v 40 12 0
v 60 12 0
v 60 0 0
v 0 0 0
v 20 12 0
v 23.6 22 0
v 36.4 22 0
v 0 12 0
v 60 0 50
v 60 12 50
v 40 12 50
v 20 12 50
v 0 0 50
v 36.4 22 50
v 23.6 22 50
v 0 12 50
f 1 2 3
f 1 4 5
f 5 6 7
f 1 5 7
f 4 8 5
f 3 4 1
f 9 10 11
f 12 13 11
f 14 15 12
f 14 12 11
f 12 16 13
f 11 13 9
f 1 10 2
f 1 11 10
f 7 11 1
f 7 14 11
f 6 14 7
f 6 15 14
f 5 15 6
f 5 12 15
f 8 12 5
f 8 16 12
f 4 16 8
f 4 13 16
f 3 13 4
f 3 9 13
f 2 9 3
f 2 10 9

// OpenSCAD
$fn = 32;

// ----------------------------------------------------------------------
// V guide rail: dovetail, 60 mm wide
// ----------------------------------------------------------------------

// --- parameters (mm) ---
rail_w = 60;              // rail width, X
base_t = 12;              // base plate thickness
v_depth = 10;             // V feature depth / height
v_half_w = 10;            // half width of the V at the base face
plate_t = 50;             // rail length, Z (the extrusion height)
top_half_w = 6.4;         // half width at the dovetail top

dovetail_base = 2 * v_half_w;  // dovetail width at the base
dovetail_top = 2 * top_half_w;  // dovetail width at the top

profile = [[0, 0], [60, 0], [60, 12], [40, 12], [36.4, 22], [23.6, 22], [20, 12], [0, 12]];  // primary outline, 8 points, counter clockwise

// --- the one profile operation ---
linear_extrude(height = plate_t) polygon(points = profile);
